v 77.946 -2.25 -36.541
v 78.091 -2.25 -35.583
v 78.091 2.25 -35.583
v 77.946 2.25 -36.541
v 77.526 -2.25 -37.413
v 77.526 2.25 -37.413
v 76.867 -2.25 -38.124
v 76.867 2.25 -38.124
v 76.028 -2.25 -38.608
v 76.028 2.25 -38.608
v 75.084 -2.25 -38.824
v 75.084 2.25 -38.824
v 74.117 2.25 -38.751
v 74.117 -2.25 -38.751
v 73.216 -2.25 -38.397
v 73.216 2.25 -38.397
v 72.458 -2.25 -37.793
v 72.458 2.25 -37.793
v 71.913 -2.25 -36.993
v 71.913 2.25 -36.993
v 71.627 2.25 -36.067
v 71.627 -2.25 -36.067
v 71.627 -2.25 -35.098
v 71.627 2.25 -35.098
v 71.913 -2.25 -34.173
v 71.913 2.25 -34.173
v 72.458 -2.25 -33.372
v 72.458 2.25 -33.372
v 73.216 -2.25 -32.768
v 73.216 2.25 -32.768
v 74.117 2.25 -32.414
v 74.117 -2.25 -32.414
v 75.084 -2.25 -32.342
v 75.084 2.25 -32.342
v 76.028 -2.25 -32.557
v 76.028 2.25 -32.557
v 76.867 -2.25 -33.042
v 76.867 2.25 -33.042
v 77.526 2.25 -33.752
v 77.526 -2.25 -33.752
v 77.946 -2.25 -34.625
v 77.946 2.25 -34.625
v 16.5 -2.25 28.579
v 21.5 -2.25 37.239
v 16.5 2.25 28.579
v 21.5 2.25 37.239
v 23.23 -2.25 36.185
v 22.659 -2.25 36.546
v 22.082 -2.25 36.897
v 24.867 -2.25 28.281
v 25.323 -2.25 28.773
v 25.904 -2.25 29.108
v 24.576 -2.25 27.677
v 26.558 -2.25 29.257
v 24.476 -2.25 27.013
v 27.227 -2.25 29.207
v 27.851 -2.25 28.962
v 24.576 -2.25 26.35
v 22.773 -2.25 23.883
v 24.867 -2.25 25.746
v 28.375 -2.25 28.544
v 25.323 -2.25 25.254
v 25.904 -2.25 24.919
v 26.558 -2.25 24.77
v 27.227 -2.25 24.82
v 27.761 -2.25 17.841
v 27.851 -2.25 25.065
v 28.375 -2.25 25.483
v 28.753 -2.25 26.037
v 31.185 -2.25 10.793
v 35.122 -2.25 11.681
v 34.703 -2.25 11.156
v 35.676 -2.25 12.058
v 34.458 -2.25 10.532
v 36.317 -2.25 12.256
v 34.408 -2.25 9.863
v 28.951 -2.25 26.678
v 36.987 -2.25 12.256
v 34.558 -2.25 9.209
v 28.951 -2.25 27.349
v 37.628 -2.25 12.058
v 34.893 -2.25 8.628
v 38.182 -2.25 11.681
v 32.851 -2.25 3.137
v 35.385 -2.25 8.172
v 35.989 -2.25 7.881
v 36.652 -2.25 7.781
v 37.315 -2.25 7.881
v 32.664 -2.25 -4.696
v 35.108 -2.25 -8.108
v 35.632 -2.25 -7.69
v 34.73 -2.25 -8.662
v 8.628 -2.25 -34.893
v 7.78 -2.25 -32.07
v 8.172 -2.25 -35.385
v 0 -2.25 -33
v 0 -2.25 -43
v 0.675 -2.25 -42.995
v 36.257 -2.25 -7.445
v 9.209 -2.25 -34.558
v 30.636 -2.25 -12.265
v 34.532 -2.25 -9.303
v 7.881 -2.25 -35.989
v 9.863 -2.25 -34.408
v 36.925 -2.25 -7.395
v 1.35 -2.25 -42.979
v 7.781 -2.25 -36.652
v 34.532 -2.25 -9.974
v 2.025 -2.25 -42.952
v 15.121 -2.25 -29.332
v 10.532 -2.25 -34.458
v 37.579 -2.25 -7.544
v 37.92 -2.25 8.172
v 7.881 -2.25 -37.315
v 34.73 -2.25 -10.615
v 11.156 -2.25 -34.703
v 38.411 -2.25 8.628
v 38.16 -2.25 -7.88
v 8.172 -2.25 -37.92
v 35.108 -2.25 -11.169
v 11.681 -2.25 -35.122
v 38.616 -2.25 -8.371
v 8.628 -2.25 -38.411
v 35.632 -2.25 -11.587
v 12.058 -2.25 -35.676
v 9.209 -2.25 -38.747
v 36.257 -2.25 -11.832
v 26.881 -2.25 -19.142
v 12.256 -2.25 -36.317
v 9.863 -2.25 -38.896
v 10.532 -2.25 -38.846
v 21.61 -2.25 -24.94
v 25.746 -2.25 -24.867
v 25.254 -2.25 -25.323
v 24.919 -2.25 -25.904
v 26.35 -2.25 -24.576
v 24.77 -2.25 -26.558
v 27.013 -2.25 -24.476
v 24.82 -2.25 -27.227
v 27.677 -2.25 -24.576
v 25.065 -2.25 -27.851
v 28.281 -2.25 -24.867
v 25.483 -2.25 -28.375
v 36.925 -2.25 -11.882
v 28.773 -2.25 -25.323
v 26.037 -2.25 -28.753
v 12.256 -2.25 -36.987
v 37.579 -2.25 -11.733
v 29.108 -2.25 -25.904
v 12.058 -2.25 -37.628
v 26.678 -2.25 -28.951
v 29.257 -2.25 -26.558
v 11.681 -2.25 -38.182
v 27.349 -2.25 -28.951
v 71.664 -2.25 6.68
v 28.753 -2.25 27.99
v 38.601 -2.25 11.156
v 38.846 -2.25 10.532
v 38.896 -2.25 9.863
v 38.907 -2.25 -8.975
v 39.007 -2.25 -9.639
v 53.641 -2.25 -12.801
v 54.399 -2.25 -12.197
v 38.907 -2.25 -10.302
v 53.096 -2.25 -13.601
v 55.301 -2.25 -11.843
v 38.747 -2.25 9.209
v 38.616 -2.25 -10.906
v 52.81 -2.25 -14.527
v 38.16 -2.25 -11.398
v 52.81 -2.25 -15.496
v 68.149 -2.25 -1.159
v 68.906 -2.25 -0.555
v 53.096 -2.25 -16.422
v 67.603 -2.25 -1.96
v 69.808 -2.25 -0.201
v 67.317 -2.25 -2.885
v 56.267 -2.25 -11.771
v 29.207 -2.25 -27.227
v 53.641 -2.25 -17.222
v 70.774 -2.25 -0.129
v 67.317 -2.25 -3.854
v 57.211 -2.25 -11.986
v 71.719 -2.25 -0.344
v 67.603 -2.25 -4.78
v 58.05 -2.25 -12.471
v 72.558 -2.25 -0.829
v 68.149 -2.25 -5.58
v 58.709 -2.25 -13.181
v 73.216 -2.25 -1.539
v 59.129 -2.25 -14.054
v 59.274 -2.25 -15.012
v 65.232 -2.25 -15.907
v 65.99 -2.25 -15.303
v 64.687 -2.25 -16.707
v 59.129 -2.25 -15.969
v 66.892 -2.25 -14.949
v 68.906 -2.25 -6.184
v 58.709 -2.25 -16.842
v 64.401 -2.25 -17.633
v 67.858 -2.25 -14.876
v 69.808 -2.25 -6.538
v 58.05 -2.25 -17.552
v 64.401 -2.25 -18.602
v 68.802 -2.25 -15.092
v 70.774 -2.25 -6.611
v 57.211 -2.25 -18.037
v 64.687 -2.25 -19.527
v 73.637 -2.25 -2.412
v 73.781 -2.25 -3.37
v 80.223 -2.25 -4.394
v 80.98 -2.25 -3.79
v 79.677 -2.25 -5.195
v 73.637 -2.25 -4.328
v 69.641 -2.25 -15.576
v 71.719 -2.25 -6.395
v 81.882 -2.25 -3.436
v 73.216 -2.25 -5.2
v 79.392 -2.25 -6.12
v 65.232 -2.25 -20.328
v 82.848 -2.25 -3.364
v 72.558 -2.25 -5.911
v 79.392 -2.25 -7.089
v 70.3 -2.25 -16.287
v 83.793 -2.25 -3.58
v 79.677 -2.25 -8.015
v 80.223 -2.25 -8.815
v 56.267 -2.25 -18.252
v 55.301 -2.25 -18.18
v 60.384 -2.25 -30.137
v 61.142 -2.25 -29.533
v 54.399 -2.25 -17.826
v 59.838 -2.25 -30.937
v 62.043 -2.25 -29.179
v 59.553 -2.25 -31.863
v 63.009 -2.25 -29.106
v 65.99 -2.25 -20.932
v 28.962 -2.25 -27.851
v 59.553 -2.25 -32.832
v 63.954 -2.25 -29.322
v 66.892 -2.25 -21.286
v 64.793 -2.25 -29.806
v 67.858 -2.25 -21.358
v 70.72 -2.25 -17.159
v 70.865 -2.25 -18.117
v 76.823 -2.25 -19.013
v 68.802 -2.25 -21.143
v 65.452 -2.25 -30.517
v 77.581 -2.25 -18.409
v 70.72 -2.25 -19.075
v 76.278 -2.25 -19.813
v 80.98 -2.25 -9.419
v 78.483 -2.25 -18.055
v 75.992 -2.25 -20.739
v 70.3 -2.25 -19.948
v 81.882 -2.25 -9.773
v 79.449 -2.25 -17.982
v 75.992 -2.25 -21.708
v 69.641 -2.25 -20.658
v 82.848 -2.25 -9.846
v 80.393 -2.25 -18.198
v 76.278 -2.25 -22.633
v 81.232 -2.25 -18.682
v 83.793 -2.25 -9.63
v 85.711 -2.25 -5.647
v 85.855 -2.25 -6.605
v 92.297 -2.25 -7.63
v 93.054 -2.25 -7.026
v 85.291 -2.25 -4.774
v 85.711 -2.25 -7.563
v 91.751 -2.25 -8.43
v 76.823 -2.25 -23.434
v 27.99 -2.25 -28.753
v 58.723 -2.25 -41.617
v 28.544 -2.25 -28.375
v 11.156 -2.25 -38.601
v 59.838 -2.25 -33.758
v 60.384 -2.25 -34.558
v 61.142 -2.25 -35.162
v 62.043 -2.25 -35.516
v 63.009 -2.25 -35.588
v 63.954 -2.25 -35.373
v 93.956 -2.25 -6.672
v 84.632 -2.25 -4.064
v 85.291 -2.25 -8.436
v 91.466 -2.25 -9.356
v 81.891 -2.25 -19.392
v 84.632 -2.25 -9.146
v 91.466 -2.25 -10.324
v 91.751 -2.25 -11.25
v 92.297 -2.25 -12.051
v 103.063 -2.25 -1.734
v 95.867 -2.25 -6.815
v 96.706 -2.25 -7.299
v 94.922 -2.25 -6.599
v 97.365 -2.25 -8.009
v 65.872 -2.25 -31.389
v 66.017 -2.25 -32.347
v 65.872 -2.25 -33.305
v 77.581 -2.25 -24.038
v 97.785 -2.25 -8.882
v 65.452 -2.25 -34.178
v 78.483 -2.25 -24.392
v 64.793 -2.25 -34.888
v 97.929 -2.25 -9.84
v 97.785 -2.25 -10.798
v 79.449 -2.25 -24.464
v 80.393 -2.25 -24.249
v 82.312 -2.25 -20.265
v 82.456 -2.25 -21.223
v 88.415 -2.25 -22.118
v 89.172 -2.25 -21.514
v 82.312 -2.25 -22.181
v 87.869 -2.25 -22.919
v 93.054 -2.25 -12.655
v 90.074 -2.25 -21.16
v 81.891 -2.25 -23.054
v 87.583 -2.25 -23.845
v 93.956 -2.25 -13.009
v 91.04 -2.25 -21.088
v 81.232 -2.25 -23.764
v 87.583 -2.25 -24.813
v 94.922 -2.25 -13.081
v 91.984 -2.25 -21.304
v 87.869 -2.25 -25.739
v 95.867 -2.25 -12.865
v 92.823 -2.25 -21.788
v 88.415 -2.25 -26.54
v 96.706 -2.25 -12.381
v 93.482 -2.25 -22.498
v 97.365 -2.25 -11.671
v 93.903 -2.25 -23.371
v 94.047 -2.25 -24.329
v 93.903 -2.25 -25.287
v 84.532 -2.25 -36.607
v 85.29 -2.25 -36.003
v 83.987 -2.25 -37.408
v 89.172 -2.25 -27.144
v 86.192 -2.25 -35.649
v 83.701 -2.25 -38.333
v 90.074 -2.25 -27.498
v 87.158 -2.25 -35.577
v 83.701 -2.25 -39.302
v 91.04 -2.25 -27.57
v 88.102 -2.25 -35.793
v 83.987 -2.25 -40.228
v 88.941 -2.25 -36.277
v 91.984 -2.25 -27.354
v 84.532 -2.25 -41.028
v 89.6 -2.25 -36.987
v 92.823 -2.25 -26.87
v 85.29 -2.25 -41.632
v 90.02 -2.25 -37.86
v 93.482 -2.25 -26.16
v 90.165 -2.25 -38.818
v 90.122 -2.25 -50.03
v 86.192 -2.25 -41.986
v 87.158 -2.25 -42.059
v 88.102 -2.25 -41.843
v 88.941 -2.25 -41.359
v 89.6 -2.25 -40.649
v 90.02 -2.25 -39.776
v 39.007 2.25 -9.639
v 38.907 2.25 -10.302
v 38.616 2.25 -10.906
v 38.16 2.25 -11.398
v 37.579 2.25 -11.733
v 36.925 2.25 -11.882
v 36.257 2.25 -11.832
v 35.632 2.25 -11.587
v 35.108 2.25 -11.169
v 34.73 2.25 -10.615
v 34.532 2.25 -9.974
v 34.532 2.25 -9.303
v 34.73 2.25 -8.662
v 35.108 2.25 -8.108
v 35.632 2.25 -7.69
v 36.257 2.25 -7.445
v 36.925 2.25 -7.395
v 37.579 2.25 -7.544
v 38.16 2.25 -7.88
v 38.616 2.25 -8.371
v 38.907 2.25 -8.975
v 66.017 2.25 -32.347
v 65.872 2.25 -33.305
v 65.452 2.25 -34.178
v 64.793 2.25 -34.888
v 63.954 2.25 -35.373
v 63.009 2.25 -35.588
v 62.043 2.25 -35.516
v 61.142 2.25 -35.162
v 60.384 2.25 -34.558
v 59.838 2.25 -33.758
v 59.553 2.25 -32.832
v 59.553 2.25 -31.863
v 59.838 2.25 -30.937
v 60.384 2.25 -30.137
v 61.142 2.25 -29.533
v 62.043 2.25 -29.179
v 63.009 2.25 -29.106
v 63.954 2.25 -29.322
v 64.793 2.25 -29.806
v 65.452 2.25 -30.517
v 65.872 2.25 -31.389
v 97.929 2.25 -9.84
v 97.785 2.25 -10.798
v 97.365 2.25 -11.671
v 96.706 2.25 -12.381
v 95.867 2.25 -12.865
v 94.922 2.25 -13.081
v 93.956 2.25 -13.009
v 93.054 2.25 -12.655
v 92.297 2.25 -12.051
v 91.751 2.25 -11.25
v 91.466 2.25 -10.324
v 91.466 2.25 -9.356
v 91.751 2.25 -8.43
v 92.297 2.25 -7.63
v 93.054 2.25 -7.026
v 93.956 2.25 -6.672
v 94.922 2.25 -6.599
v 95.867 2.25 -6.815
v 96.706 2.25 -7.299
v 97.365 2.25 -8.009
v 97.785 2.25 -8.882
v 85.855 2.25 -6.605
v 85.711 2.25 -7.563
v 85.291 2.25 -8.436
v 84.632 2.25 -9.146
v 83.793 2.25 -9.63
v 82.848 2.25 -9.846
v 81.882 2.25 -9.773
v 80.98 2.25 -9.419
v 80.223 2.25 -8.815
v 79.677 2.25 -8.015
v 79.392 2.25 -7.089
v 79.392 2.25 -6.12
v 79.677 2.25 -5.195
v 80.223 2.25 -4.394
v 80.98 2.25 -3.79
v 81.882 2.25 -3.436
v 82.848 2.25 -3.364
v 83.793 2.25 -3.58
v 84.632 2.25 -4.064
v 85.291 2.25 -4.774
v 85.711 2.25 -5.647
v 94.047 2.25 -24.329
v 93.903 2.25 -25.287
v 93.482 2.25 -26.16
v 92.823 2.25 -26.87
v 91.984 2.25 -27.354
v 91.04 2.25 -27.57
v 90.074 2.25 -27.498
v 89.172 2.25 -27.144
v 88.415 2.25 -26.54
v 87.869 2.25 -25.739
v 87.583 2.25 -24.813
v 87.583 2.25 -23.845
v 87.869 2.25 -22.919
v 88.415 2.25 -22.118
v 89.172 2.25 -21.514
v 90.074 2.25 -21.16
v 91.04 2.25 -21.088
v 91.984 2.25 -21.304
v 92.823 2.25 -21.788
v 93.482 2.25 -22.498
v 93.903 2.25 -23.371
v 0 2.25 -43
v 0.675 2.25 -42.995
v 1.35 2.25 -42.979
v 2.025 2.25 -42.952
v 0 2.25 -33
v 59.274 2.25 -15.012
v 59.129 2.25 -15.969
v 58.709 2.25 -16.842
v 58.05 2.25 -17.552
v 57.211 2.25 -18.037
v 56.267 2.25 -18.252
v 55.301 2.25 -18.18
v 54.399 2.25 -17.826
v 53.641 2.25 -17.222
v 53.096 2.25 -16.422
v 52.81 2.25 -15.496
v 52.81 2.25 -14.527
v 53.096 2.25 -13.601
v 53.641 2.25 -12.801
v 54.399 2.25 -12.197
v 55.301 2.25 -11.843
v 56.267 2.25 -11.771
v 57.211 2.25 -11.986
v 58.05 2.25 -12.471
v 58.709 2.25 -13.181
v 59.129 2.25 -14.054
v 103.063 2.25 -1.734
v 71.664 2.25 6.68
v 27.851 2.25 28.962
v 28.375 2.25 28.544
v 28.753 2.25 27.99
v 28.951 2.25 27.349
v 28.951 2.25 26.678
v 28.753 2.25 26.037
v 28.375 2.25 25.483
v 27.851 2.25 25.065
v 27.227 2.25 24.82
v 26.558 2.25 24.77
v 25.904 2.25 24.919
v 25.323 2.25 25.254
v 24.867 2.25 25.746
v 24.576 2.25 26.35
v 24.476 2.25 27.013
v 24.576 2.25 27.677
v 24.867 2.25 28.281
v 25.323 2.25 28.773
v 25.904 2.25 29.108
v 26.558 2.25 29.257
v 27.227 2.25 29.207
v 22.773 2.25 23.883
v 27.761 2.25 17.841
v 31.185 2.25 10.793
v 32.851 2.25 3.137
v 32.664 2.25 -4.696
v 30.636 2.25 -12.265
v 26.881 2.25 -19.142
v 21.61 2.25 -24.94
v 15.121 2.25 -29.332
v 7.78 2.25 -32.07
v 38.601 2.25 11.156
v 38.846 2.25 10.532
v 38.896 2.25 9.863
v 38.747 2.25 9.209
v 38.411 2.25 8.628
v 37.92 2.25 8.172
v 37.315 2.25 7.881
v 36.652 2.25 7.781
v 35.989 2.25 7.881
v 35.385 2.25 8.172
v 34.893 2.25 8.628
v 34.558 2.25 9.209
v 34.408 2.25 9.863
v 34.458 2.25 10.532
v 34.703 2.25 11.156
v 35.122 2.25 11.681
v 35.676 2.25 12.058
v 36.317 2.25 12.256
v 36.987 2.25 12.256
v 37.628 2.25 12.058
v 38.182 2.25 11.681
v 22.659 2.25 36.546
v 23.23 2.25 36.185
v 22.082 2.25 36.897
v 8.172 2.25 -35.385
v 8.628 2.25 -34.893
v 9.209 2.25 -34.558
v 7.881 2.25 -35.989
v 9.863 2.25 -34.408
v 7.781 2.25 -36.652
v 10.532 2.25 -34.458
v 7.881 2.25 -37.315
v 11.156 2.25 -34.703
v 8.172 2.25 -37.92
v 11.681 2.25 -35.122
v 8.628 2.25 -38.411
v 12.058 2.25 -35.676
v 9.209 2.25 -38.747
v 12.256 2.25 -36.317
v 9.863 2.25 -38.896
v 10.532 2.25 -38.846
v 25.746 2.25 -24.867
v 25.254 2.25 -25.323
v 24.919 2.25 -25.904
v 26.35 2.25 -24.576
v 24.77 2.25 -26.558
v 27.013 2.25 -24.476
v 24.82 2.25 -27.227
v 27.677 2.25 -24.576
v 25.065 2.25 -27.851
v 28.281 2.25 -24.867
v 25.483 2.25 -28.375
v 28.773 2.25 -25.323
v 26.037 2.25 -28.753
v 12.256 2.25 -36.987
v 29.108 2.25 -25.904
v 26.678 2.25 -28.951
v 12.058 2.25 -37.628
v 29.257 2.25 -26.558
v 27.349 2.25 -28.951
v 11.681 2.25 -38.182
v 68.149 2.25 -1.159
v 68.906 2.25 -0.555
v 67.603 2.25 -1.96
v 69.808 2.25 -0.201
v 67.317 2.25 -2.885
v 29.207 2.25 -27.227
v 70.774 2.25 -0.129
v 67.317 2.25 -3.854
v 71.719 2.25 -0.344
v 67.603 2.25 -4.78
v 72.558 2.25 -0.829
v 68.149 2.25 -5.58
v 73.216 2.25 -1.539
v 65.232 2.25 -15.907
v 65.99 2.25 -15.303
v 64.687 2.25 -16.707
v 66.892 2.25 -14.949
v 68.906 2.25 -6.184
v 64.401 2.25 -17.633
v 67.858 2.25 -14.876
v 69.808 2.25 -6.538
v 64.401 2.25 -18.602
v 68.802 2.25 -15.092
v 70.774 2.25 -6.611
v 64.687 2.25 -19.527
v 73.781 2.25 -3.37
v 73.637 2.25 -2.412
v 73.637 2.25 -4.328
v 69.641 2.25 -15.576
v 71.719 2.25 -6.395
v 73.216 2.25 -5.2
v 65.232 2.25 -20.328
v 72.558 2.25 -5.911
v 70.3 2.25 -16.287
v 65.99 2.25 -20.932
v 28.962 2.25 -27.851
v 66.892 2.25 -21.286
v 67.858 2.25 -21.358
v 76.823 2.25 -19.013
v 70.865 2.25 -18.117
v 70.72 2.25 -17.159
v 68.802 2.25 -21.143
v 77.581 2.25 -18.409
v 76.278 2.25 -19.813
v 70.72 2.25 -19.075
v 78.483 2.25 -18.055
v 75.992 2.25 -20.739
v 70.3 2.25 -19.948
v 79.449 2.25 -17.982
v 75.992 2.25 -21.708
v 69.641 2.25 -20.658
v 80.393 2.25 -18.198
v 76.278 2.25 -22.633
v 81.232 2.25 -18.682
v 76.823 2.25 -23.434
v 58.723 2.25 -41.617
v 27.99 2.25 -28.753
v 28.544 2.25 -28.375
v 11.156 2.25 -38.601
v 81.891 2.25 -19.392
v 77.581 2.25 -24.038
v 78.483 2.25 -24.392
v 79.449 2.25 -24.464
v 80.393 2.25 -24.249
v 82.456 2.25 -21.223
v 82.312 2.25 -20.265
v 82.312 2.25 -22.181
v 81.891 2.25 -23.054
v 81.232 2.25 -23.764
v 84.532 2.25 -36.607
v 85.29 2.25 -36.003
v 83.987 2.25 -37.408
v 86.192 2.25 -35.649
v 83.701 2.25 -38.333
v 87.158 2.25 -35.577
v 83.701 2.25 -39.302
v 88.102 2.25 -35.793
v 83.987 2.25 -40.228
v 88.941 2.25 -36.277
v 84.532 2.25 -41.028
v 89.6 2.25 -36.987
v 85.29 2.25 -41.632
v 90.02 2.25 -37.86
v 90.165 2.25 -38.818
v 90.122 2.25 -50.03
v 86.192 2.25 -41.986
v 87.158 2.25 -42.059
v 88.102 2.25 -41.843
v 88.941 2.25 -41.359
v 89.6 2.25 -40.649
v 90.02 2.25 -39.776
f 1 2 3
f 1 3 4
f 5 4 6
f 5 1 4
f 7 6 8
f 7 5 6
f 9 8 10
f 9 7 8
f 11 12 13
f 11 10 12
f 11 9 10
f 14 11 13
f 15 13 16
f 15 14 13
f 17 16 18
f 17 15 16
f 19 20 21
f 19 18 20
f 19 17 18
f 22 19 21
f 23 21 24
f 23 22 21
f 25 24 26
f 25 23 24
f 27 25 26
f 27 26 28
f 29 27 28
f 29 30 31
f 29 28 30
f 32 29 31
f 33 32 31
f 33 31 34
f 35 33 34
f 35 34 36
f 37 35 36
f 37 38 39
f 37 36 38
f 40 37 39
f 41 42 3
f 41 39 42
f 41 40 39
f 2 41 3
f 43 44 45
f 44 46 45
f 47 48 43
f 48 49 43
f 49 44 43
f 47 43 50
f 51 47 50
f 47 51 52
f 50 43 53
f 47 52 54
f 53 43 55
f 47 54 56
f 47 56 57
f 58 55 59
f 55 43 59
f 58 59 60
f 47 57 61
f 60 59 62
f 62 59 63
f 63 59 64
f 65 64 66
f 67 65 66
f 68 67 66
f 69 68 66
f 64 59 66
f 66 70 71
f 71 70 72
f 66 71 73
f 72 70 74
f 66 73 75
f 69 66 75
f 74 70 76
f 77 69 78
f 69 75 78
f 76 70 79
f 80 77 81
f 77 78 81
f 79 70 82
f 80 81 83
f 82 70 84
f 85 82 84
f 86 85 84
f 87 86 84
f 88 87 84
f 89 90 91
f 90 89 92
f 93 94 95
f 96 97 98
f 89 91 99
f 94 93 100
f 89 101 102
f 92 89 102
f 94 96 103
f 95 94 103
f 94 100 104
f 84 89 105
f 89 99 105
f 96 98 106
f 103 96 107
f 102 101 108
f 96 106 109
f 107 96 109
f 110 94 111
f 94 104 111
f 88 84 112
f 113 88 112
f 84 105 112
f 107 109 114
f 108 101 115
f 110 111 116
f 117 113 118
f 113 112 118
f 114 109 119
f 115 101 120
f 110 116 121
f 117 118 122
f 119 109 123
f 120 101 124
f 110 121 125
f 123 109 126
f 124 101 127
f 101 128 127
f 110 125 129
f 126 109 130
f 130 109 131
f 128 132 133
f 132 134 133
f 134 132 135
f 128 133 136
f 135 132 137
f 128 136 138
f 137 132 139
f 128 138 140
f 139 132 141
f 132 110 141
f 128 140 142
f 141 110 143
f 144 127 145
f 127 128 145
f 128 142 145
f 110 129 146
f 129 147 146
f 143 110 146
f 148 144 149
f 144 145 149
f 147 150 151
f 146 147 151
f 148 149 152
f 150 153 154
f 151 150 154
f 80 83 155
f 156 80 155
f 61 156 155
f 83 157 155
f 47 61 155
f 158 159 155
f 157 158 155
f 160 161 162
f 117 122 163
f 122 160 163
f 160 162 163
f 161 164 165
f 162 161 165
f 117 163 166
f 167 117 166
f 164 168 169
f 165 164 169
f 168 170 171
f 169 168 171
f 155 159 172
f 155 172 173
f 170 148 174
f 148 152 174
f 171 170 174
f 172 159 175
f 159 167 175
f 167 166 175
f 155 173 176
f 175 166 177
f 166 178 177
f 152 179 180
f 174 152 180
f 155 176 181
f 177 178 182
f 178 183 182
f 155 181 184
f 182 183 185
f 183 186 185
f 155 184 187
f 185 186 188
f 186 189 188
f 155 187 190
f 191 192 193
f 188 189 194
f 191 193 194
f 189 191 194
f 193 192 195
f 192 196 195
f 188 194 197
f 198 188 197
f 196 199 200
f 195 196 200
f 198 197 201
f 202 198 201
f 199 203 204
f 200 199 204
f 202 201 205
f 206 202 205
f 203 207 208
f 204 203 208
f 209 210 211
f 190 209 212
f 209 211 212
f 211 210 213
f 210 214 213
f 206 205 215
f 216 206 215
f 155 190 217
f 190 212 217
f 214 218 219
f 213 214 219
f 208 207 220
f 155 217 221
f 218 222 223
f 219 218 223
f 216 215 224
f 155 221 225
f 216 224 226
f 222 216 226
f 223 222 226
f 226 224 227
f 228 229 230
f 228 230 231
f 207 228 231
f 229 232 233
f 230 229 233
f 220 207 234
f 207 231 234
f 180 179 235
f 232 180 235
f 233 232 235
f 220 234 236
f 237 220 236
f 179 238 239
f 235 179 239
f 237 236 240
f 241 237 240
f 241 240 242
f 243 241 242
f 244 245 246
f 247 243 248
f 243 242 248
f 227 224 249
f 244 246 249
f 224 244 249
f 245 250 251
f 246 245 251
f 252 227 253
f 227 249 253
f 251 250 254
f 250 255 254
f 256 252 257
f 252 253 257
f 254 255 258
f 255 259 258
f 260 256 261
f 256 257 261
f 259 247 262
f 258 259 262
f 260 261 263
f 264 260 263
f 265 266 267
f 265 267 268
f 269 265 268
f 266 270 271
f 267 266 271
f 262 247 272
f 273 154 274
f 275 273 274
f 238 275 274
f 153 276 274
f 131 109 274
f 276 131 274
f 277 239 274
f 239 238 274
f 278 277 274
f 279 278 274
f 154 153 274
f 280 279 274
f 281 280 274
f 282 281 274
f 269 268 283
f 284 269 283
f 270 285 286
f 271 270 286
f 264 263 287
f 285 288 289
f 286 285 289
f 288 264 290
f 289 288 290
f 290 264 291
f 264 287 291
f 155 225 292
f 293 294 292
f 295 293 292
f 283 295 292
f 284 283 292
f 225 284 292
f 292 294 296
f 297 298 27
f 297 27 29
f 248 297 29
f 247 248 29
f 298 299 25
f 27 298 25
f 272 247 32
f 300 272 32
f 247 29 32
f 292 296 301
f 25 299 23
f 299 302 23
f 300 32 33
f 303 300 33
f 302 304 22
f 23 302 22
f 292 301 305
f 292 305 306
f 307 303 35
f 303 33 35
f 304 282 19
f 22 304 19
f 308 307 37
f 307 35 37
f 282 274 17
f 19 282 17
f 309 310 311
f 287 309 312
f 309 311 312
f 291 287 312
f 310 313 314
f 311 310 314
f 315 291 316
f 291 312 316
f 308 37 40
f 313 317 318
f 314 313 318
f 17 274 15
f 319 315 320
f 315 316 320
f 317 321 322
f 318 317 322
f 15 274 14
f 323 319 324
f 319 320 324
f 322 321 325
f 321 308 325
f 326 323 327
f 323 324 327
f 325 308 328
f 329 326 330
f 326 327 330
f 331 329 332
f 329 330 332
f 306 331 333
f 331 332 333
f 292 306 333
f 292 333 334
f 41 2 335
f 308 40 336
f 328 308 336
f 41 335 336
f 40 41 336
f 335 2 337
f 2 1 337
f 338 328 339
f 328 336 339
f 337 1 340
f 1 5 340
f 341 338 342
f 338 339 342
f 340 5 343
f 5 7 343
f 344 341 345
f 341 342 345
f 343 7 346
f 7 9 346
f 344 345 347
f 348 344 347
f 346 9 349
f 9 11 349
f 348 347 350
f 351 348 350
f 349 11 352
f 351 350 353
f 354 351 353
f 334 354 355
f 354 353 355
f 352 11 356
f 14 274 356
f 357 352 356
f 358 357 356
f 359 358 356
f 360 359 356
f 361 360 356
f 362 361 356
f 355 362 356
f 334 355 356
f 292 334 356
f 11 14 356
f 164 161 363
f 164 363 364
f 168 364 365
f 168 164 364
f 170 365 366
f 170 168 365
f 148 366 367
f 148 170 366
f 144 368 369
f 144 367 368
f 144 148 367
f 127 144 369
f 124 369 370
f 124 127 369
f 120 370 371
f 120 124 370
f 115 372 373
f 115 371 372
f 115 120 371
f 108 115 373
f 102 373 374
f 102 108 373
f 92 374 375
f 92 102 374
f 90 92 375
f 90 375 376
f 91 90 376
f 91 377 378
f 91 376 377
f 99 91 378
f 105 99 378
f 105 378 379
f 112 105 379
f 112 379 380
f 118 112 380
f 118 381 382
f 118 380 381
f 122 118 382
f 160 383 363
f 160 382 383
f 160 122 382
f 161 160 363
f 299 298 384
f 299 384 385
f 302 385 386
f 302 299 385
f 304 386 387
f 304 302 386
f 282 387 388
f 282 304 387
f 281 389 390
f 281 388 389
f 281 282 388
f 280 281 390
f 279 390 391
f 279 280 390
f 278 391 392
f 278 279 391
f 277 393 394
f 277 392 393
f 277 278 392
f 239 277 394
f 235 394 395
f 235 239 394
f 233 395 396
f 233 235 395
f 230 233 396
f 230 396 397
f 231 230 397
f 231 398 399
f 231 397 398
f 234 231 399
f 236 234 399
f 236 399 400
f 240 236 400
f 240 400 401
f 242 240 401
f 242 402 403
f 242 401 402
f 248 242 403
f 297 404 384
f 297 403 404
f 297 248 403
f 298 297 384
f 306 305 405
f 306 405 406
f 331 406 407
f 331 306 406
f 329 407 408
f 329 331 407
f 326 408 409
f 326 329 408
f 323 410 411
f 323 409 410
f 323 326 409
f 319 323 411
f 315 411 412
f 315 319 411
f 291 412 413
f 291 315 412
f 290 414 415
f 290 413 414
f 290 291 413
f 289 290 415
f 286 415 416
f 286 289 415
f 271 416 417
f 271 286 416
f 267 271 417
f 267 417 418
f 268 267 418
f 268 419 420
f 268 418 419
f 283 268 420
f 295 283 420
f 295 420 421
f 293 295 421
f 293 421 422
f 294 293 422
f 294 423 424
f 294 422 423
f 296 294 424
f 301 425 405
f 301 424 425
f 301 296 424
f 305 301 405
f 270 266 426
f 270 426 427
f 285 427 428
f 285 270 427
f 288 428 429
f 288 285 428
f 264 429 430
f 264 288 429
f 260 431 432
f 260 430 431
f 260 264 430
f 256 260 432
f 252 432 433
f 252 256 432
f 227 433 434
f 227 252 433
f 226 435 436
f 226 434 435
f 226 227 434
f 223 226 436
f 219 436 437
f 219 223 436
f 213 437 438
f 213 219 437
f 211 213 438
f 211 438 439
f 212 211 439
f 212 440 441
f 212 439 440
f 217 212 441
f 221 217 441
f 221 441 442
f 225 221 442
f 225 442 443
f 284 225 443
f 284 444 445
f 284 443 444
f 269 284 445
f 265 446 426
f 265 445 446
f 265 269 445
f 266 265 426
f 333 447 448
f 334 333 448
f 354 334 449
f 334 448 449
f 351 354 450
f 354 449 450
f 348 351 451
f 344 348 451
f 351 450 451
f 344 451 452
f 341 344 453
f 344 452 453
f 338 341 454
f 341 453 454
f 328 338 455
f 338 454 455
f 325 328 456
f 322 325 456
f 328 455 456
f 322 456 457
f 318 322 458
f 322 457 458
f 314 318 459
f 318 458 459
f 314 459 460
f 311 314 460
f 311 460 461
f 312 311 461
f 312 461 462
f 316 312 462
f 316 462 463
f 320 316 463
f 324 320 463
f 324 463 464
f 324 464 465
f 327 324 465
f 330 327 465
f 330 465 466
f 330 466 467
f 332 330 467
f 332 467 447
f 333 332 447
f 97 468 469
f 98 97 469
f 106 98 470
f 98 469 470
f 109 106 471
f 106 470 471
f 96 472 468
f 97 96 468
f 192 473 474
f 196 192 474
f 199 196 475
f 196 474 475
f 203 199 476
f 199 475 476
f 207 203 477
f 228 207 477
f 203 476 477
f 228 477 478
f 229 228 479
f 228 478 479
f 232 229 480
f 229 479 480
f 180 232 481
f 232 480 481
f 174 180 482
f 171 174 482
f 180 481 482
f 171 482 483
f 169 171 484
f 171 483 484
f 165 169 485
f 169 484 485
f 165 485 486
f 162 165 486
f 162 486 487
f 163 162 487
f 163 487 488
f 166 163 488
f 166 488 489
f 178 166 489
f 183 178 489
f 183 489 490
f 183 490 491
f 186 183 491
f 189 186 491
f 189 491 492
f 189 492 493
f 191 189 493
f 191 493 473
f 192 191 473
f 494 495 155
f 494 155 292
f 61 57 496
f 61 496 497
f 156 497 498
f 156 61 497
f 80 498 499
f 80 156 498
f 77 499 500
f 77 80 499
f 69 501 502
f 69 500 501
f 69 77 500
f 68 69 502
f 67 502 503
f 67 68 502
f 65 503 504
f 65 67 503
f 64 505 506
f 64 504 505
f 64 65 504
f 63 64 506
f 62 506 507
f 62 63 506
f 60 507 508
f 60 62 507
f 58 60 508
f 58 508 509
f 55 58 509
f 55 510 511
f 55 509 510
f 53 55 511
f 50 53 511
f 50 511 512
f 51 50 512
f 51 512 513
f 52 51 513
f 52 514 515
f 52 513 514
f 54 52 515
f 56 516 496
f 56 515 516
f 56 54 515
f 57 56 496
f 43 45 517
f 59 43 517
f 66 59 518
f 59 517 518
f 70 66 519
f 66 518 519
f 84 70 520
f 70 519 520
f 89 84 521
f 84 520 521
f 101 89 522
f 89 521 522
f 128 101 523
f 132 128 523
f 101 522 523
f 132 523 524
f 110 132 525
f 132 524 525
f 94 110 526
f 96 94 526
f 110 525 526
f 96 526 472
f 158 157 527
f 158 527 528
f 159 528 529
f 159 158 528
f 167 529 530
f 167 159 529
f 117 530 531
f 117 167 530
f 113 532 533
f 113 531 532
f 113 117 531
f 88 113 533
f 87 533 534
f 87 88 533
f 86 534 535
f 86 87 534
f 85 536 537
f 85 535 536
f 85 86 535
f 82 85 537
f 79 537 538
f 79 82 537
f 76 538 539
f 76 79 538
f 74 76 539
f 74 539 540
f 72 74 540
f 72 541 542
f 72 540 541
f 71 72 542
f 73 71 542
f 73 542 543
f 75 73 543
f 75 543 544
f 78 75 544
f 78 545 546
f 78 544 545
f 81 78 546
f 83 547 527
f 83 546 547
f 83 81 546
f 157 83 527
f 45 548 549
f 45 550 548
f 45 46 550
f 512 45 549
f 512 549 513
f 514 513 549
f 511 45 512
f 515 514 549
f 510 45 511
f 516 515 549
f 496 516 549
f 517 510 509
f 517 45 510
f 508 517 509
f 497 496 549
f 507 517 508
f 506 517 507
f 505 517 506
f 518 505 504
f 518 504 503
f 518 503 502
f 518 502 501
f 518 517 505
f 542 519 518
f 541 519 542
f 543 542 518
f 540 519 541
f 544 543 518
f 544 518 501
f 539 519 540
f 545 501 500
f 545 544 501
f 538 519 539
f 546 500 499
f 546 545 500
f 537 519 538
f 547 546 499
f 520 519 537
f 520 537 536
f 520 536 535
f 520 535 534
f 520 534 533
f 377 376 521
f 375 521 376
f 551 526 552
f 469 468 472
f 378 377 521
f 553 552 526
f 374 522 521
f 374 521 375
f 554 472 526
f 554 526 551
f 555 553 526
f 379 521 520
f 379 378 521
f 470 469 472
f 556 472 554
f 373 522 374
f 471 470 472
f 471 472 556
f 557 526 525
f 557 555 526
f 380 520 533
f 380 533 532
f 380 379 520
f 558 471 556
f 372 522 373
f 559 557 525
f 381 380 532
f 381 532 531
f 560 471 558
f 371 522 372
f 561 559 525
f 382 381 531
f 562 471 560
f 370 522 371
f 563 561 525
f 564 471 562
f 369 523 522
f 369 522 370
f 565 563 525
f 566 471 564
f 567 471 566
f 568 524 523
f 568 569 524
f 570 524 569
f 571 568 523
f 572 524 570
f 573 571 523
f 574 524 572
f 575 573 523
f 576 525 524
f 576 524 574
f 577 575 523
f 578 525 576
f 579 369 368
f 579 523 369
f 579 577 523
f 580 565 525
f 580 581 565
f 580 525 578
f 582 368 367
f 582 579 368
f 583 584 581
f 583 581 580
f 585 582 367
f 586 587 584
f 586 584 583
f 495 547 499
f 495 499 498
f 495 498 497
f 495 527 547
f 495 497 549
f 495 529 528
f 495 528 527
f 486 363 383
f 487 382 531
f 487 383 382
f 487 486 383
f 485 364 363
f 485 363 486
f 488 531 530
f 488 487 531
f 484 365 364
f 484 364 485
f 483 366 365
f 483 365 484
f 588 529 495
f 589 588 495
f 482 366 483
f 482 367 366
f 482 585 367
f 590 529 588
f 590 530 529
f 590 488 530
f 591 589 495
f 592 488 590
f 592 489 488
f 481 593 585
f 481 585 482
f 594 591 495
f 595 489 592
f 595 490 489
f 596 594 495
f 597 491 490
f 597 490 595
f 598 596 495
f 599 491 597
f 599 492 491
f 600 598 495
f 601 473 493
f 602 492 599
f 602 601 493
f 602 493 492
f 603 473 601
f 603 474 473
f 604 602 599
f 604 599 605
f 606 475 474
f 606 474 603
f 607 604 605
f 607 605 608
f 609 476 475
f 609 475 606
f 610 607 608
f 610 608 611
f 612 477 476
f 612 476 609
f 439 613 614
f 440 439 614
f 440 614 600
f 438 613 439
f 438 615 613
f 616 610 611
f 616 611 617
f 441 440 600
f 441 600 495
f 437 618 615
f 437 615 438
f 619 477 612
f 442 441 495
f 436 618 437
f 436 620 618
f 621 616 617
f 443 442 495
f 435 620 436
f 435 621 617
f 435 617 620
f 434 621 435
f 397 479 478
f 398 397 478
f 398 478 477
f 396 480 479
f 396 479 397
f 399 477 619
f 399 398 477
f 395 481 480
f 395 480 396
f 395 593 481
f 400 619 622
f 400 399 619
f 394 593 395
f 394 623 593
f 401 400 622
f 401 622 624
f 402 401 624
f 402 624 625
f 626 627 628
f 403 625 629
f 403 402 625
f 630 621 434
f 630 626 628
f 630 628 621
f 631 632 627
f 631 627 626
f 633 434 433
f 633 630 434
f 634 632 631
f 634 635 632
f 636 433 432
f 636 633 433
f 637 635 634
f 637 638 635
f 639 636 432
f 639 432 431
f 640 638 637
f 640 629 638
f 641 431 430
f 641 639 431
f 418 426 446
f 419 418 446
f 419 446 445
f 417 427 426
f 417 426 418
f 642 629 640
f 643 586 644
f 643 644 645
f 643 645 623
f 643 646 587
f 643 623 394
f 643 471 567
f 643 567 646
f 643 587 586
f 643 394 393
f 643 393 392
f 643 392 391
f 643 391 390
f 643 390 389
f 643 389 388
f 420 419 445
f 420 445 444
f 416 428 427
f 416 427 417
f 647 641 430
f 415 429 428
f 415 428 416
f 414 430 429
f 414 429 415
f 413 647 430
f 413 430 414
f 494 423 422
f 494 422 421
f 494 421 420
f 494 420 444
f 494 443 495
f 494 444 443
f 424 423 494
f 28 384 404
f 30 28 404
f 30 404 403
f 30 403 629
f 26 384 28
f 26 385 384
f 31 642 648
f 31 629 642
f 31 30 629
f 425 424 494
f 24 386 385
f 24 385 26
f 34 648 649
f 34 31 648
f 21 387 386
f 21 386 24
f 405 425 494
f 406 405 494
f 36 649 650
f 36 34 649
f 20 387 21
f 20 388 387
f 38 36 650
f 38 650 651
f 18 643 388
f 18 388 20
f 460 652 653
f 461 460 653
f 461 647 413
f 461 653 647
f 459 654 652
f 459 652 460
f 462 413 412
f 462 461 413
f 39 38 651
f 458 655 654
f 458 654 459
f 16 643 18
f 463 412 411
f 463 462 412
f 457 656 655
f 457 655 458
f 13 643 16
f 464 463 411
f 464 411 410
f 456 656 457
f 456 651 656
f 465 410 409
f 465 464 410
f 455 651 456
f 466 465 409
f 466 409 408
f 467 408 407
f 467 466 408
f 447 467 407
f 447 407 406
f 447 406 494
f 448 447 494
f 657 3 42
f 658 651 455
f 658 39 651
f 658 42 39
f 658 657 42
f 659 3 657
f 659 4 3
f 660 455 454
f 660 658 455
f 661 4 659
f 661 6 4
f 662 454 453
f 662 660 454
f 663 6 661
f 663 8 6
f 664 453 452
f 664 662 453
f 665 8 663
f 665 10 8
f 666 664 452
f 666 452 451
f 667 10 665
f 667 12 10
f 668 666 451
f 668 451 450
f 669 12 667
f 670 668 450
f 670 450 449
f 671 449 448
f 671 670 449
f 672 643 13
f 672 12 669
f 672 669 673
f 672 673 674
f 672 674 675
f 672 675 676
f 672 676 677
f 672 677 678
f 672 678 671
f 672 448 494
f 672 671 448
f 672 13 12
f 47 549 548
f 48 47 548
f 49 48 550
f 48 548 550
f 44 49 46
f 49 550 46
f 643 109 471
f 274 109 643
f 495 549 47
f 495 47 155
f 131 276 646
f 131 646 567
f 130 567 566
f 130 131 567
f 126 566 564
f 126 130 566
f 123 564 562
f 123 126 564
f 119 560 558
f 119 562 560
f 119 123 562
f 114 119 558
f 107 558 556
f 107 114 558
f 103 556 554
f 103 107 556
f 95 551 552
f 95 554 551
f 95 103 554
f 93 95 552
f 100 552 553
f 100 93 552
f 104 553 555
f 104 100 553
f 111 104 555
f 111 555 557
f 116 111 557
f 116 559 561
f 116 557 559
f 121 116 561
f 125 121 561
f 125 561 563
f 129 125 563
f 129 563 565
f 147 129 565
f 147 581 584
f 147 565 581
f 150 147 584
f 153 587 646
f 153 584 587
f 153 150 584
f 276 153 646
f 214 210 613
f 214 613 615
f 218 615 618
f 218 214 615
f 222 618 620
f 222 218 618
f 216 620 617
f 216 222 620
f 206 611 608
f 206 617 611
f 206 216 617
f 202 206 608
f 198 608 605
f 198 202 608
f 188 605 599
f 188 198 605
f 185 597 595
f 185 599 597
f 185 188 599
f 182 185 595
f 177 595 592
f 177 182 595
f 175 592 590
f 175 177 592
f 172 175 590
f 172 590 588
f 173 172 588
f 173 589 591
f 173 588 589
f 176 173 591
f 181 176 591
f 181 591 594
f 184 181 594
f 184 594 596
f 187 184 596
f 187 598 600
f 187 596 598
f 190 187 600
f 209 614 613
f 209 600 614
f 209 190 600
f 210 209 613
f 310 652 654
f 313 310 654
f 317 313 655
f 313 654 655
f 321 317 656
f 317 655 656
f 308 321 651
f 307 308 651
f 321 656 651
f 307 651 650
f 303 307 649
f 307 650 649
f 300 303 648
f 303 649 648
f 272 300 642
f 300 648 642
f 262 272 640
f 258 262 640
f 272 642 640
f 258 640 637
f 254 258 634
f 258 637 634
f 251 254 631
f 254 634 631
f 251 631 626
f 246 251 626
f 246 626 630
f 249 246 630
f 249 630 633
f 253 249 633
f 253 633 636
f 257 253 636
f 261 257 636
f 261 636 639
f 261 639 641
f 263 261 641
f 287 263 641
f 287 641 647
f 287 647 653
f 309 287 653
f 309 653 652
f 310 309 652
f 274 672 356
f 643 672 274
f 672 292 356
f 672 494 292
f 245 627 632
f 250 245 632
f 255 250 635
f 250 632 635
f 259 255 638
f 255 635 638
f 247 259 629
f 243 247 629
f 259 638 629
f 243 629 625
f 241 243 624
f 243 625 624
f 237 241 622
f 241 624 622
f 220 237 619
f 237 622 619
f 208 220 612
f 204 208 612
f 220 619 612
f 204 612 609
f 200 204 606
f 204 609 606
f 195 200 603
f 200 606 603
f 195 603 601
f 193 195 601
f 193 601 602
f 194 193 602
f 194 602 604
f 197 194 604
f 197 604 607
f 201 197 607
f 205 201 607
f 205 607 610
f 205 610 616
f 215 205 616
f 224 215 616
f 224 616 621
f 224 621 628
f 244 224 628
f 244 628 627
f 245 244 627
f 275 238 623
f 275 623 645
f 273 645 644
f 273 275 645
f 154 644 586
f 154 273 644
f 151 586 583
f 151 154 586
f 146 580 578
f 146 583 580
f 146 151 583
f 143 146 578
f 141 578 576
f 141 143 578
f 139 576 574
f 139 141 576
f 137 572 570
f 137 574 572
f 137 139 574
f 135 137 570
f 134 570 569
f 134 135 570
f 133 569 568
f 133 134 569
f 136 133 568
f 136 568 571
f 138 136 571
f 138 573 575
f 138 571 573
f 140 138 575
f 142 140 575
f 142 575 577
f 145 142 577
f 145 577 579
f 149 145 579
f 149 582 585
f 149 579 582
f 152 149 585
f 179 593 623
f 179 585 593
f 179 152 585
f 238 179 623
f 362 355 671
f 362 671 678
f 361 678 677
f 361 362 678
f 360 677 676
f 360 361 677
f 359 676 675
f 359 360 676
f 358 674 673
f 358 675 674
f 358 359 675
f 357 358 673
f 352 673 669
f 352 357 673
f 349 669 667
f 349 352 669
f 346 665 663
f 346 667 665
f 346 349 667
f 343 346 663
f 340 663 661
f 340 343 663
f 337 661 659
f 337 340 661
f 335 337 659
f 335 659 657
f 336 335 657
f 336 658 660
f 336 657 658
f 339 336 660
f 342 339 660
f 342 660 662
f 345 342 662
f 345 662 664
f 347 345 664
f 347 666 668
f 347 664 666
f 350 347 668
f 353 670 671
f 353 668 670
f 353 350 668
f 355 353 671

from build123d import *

# Parameters (mm, degrees)
BOSS_EXTRUDE1_DEPTH             = 2.25
BOSS_EXTRUDE2_DEPTH             = 2.25
BOSS_EXTRUDE3_DEPTH             = 2.25
CUT_EXTRUDE1_START              = -5.5
SKETCH2_R                       = 2.25
CUT_EXTRUDE1_DEPTH              = 6.5
CIRPATTERN1_COUNT               = 3
CIRPATTERN1_ANGLE               = 60
CIRPATTERN1_THE_OTHER_WAY_COUNT = 3
CIRPATTERN1_THE_OTHER_WAY_ANGLE = 60
CUT_EXTRUDE2_START              = -5.5
SKETCH6_R                       = 3.25
CUT_EXTRUDE2_DEPTH              = 6.5
LPATTERN1_COUNT                 = 3
LPATTERN1_PITCH                 = 12.5
SKETCH7_R                       = 3.25
CUT_EXTRUDE3_DEPTH              = 10
LPATTERN2_COUNT                 = 4
LPATTERN2_PITCH                 = 12


with BuildPart() as part:
    # Sketch1 → Boss-Extrude1 (new body, symmetric)
    with BuildSketch(Plane(origin=(0, 0, 0), x_dir=(1, 0, 0), z_dir=(0, 1, 0))):
        with BuildLine():
            Line((0, 33), (0, 43))
            ThreePointArc((0, 43), (41.53481053, 11.129218939), (21.5, -37.239092363))
            Line((21.5, -37.239092363), (16.5, -28.578838325))
            ThreePointArc((16.5, -28.578838325), (31.875552268, 8.541028488), (0, 33))
        make_face()
    extrude(amount=BOSS_EXTRUDE1_DEPTH, both=True)

    # Sketch4 → Boss-Extrude2 (add, symmetric)
    with BuildSketch(Plane(origin=(0, 0, 0), x_dir=(1, 0, 0), z_dir=(0, 1, 0))):
        Polygon((90.122106501, 50.030050167), (25.40507614, 32.689174146), (38.346028395, -15.607117169), (103.063058756, 1.733758853), align=None)
    extrude(amount=BOSS_EXTRUDE2_DEPTH, both=True)

    # Sketch5 → Boss-Extrude3 (add, symmetric)
    with BuildSketch(Plane(origin=(0, 0, 0), x_dir=(1, 0, 0), z_dir=(0, 1, 0))):
        Polygon((0, 43), (58.722616268, 41.616582117), (27.323126035, 33.203114066), align=None)
        Polygon((71.663568523, -6.679709198), (40.26407829, -15.093177248), (21.5, -37.239092363), align=None)
    extrude(amount=BOSS_EXTRUDE3_DEPTH, both=True)

    # Sketch2 → Cut-Extrude1 (cut)
    with BuildSketch(Plane(origin=(0, 2.25, 0), x_dir=(1, 0, 0), z_dir=(0, 1, 0)).offset(CUT_EXTRUDE1_START)):
        with Locations((36.757261811, 9.638656763)):
            Circle(SKETCH2_R)
    cut_extrude1 = extrude(amount=CUT_EXTRUDE1_DEPTH, mode=Mode.SUBTRACT)

    # CirPattern1: Cut-Extrude1 ×3 about axis
    cirpattern1_axis = Axis((0, 0, 0), (0, -1, 0))
    for i in range(1, CIRPATTERN1_COUNT):
        add(cut_extrude1.rotate(cirpattern1_axis, i * CIRPATTERN1_ANGLE / (CIRPATTERN1_COUNT - 1)), mode=Mode.SUBTRACT)

    # CirPattern1 the other way: Cut-Extrude1 ×3 about axis
    cirpattern1_the_other_way_axis = Axis((0, 0, 0), (0, 1, 0))
    for i in range(1, CIRPATTERN1_THE_OTHER_WAY_COUNT):
        add(cut_extrude1.rotate(cirpattern1_the_other_way_axis, i * CIRPATTERN1_THE_OTHER_WAY_ANGLE / (CIRPATTERN1_THE_OTHER_WAY_COUNT - 1)), mode=Mode.SUBTRACT)

    # Sketch6 → Cut-Extrude2 (cut)
    with BuildSketch(Plane(origin=(0, 2.25, 0), x_dir=(1, 0, 0), z_dir=(0, 1, 0)).offset(CUT_EXTRUDE2_START)):
        with Locations((94.679313348, 9.840102845)):
            Circle(SKETCH6_R)
        with Locations((86.914741995, 38.817877634)):
            Circle(SKETCH6_R)
    cut_extrude2 = extrude(amount=CUT_EXTRUDE2_DEPTH, mode=Mode.SUBTRACT)

    # LPattern1: Cut-Extrude2 ×3
    with Locations(*[Vector(-0.965925826, 0, 0.258819045) * (i * LPATTERN1_PITCH) for i in range(1, LPATTERN1_COUNT)]):
        add(cut_extrude2, mode=Mode.SUBTRACT)

    # Sketch7 → Cut-Extrude3 (cut)
    with BuildSketch(Plane(origin=(0, 2.25, 0), x_dir=(1, 0, 0), z_dir=(0, 1, 0))):
        with Locations((90.797027671, 24.32899024)):
            Circle(SKETCH7_R)
    cut_extrude3 = extrude(amount=-CUT_EXTRUDE3_DEPTH, mode=Mode.SUBTRACT)

    # LPattern2: Cut-Extrude3 ×4
    with Locations(*[Vector(-0.965925826, 0, 0.258819045) * (i * LPATTERN2_PITCH) for i in range(1, LPATTERN2_COUNT)]):
        add(cut_extrude3, mode=Mode.SUBTRACT)


solid = part.part
